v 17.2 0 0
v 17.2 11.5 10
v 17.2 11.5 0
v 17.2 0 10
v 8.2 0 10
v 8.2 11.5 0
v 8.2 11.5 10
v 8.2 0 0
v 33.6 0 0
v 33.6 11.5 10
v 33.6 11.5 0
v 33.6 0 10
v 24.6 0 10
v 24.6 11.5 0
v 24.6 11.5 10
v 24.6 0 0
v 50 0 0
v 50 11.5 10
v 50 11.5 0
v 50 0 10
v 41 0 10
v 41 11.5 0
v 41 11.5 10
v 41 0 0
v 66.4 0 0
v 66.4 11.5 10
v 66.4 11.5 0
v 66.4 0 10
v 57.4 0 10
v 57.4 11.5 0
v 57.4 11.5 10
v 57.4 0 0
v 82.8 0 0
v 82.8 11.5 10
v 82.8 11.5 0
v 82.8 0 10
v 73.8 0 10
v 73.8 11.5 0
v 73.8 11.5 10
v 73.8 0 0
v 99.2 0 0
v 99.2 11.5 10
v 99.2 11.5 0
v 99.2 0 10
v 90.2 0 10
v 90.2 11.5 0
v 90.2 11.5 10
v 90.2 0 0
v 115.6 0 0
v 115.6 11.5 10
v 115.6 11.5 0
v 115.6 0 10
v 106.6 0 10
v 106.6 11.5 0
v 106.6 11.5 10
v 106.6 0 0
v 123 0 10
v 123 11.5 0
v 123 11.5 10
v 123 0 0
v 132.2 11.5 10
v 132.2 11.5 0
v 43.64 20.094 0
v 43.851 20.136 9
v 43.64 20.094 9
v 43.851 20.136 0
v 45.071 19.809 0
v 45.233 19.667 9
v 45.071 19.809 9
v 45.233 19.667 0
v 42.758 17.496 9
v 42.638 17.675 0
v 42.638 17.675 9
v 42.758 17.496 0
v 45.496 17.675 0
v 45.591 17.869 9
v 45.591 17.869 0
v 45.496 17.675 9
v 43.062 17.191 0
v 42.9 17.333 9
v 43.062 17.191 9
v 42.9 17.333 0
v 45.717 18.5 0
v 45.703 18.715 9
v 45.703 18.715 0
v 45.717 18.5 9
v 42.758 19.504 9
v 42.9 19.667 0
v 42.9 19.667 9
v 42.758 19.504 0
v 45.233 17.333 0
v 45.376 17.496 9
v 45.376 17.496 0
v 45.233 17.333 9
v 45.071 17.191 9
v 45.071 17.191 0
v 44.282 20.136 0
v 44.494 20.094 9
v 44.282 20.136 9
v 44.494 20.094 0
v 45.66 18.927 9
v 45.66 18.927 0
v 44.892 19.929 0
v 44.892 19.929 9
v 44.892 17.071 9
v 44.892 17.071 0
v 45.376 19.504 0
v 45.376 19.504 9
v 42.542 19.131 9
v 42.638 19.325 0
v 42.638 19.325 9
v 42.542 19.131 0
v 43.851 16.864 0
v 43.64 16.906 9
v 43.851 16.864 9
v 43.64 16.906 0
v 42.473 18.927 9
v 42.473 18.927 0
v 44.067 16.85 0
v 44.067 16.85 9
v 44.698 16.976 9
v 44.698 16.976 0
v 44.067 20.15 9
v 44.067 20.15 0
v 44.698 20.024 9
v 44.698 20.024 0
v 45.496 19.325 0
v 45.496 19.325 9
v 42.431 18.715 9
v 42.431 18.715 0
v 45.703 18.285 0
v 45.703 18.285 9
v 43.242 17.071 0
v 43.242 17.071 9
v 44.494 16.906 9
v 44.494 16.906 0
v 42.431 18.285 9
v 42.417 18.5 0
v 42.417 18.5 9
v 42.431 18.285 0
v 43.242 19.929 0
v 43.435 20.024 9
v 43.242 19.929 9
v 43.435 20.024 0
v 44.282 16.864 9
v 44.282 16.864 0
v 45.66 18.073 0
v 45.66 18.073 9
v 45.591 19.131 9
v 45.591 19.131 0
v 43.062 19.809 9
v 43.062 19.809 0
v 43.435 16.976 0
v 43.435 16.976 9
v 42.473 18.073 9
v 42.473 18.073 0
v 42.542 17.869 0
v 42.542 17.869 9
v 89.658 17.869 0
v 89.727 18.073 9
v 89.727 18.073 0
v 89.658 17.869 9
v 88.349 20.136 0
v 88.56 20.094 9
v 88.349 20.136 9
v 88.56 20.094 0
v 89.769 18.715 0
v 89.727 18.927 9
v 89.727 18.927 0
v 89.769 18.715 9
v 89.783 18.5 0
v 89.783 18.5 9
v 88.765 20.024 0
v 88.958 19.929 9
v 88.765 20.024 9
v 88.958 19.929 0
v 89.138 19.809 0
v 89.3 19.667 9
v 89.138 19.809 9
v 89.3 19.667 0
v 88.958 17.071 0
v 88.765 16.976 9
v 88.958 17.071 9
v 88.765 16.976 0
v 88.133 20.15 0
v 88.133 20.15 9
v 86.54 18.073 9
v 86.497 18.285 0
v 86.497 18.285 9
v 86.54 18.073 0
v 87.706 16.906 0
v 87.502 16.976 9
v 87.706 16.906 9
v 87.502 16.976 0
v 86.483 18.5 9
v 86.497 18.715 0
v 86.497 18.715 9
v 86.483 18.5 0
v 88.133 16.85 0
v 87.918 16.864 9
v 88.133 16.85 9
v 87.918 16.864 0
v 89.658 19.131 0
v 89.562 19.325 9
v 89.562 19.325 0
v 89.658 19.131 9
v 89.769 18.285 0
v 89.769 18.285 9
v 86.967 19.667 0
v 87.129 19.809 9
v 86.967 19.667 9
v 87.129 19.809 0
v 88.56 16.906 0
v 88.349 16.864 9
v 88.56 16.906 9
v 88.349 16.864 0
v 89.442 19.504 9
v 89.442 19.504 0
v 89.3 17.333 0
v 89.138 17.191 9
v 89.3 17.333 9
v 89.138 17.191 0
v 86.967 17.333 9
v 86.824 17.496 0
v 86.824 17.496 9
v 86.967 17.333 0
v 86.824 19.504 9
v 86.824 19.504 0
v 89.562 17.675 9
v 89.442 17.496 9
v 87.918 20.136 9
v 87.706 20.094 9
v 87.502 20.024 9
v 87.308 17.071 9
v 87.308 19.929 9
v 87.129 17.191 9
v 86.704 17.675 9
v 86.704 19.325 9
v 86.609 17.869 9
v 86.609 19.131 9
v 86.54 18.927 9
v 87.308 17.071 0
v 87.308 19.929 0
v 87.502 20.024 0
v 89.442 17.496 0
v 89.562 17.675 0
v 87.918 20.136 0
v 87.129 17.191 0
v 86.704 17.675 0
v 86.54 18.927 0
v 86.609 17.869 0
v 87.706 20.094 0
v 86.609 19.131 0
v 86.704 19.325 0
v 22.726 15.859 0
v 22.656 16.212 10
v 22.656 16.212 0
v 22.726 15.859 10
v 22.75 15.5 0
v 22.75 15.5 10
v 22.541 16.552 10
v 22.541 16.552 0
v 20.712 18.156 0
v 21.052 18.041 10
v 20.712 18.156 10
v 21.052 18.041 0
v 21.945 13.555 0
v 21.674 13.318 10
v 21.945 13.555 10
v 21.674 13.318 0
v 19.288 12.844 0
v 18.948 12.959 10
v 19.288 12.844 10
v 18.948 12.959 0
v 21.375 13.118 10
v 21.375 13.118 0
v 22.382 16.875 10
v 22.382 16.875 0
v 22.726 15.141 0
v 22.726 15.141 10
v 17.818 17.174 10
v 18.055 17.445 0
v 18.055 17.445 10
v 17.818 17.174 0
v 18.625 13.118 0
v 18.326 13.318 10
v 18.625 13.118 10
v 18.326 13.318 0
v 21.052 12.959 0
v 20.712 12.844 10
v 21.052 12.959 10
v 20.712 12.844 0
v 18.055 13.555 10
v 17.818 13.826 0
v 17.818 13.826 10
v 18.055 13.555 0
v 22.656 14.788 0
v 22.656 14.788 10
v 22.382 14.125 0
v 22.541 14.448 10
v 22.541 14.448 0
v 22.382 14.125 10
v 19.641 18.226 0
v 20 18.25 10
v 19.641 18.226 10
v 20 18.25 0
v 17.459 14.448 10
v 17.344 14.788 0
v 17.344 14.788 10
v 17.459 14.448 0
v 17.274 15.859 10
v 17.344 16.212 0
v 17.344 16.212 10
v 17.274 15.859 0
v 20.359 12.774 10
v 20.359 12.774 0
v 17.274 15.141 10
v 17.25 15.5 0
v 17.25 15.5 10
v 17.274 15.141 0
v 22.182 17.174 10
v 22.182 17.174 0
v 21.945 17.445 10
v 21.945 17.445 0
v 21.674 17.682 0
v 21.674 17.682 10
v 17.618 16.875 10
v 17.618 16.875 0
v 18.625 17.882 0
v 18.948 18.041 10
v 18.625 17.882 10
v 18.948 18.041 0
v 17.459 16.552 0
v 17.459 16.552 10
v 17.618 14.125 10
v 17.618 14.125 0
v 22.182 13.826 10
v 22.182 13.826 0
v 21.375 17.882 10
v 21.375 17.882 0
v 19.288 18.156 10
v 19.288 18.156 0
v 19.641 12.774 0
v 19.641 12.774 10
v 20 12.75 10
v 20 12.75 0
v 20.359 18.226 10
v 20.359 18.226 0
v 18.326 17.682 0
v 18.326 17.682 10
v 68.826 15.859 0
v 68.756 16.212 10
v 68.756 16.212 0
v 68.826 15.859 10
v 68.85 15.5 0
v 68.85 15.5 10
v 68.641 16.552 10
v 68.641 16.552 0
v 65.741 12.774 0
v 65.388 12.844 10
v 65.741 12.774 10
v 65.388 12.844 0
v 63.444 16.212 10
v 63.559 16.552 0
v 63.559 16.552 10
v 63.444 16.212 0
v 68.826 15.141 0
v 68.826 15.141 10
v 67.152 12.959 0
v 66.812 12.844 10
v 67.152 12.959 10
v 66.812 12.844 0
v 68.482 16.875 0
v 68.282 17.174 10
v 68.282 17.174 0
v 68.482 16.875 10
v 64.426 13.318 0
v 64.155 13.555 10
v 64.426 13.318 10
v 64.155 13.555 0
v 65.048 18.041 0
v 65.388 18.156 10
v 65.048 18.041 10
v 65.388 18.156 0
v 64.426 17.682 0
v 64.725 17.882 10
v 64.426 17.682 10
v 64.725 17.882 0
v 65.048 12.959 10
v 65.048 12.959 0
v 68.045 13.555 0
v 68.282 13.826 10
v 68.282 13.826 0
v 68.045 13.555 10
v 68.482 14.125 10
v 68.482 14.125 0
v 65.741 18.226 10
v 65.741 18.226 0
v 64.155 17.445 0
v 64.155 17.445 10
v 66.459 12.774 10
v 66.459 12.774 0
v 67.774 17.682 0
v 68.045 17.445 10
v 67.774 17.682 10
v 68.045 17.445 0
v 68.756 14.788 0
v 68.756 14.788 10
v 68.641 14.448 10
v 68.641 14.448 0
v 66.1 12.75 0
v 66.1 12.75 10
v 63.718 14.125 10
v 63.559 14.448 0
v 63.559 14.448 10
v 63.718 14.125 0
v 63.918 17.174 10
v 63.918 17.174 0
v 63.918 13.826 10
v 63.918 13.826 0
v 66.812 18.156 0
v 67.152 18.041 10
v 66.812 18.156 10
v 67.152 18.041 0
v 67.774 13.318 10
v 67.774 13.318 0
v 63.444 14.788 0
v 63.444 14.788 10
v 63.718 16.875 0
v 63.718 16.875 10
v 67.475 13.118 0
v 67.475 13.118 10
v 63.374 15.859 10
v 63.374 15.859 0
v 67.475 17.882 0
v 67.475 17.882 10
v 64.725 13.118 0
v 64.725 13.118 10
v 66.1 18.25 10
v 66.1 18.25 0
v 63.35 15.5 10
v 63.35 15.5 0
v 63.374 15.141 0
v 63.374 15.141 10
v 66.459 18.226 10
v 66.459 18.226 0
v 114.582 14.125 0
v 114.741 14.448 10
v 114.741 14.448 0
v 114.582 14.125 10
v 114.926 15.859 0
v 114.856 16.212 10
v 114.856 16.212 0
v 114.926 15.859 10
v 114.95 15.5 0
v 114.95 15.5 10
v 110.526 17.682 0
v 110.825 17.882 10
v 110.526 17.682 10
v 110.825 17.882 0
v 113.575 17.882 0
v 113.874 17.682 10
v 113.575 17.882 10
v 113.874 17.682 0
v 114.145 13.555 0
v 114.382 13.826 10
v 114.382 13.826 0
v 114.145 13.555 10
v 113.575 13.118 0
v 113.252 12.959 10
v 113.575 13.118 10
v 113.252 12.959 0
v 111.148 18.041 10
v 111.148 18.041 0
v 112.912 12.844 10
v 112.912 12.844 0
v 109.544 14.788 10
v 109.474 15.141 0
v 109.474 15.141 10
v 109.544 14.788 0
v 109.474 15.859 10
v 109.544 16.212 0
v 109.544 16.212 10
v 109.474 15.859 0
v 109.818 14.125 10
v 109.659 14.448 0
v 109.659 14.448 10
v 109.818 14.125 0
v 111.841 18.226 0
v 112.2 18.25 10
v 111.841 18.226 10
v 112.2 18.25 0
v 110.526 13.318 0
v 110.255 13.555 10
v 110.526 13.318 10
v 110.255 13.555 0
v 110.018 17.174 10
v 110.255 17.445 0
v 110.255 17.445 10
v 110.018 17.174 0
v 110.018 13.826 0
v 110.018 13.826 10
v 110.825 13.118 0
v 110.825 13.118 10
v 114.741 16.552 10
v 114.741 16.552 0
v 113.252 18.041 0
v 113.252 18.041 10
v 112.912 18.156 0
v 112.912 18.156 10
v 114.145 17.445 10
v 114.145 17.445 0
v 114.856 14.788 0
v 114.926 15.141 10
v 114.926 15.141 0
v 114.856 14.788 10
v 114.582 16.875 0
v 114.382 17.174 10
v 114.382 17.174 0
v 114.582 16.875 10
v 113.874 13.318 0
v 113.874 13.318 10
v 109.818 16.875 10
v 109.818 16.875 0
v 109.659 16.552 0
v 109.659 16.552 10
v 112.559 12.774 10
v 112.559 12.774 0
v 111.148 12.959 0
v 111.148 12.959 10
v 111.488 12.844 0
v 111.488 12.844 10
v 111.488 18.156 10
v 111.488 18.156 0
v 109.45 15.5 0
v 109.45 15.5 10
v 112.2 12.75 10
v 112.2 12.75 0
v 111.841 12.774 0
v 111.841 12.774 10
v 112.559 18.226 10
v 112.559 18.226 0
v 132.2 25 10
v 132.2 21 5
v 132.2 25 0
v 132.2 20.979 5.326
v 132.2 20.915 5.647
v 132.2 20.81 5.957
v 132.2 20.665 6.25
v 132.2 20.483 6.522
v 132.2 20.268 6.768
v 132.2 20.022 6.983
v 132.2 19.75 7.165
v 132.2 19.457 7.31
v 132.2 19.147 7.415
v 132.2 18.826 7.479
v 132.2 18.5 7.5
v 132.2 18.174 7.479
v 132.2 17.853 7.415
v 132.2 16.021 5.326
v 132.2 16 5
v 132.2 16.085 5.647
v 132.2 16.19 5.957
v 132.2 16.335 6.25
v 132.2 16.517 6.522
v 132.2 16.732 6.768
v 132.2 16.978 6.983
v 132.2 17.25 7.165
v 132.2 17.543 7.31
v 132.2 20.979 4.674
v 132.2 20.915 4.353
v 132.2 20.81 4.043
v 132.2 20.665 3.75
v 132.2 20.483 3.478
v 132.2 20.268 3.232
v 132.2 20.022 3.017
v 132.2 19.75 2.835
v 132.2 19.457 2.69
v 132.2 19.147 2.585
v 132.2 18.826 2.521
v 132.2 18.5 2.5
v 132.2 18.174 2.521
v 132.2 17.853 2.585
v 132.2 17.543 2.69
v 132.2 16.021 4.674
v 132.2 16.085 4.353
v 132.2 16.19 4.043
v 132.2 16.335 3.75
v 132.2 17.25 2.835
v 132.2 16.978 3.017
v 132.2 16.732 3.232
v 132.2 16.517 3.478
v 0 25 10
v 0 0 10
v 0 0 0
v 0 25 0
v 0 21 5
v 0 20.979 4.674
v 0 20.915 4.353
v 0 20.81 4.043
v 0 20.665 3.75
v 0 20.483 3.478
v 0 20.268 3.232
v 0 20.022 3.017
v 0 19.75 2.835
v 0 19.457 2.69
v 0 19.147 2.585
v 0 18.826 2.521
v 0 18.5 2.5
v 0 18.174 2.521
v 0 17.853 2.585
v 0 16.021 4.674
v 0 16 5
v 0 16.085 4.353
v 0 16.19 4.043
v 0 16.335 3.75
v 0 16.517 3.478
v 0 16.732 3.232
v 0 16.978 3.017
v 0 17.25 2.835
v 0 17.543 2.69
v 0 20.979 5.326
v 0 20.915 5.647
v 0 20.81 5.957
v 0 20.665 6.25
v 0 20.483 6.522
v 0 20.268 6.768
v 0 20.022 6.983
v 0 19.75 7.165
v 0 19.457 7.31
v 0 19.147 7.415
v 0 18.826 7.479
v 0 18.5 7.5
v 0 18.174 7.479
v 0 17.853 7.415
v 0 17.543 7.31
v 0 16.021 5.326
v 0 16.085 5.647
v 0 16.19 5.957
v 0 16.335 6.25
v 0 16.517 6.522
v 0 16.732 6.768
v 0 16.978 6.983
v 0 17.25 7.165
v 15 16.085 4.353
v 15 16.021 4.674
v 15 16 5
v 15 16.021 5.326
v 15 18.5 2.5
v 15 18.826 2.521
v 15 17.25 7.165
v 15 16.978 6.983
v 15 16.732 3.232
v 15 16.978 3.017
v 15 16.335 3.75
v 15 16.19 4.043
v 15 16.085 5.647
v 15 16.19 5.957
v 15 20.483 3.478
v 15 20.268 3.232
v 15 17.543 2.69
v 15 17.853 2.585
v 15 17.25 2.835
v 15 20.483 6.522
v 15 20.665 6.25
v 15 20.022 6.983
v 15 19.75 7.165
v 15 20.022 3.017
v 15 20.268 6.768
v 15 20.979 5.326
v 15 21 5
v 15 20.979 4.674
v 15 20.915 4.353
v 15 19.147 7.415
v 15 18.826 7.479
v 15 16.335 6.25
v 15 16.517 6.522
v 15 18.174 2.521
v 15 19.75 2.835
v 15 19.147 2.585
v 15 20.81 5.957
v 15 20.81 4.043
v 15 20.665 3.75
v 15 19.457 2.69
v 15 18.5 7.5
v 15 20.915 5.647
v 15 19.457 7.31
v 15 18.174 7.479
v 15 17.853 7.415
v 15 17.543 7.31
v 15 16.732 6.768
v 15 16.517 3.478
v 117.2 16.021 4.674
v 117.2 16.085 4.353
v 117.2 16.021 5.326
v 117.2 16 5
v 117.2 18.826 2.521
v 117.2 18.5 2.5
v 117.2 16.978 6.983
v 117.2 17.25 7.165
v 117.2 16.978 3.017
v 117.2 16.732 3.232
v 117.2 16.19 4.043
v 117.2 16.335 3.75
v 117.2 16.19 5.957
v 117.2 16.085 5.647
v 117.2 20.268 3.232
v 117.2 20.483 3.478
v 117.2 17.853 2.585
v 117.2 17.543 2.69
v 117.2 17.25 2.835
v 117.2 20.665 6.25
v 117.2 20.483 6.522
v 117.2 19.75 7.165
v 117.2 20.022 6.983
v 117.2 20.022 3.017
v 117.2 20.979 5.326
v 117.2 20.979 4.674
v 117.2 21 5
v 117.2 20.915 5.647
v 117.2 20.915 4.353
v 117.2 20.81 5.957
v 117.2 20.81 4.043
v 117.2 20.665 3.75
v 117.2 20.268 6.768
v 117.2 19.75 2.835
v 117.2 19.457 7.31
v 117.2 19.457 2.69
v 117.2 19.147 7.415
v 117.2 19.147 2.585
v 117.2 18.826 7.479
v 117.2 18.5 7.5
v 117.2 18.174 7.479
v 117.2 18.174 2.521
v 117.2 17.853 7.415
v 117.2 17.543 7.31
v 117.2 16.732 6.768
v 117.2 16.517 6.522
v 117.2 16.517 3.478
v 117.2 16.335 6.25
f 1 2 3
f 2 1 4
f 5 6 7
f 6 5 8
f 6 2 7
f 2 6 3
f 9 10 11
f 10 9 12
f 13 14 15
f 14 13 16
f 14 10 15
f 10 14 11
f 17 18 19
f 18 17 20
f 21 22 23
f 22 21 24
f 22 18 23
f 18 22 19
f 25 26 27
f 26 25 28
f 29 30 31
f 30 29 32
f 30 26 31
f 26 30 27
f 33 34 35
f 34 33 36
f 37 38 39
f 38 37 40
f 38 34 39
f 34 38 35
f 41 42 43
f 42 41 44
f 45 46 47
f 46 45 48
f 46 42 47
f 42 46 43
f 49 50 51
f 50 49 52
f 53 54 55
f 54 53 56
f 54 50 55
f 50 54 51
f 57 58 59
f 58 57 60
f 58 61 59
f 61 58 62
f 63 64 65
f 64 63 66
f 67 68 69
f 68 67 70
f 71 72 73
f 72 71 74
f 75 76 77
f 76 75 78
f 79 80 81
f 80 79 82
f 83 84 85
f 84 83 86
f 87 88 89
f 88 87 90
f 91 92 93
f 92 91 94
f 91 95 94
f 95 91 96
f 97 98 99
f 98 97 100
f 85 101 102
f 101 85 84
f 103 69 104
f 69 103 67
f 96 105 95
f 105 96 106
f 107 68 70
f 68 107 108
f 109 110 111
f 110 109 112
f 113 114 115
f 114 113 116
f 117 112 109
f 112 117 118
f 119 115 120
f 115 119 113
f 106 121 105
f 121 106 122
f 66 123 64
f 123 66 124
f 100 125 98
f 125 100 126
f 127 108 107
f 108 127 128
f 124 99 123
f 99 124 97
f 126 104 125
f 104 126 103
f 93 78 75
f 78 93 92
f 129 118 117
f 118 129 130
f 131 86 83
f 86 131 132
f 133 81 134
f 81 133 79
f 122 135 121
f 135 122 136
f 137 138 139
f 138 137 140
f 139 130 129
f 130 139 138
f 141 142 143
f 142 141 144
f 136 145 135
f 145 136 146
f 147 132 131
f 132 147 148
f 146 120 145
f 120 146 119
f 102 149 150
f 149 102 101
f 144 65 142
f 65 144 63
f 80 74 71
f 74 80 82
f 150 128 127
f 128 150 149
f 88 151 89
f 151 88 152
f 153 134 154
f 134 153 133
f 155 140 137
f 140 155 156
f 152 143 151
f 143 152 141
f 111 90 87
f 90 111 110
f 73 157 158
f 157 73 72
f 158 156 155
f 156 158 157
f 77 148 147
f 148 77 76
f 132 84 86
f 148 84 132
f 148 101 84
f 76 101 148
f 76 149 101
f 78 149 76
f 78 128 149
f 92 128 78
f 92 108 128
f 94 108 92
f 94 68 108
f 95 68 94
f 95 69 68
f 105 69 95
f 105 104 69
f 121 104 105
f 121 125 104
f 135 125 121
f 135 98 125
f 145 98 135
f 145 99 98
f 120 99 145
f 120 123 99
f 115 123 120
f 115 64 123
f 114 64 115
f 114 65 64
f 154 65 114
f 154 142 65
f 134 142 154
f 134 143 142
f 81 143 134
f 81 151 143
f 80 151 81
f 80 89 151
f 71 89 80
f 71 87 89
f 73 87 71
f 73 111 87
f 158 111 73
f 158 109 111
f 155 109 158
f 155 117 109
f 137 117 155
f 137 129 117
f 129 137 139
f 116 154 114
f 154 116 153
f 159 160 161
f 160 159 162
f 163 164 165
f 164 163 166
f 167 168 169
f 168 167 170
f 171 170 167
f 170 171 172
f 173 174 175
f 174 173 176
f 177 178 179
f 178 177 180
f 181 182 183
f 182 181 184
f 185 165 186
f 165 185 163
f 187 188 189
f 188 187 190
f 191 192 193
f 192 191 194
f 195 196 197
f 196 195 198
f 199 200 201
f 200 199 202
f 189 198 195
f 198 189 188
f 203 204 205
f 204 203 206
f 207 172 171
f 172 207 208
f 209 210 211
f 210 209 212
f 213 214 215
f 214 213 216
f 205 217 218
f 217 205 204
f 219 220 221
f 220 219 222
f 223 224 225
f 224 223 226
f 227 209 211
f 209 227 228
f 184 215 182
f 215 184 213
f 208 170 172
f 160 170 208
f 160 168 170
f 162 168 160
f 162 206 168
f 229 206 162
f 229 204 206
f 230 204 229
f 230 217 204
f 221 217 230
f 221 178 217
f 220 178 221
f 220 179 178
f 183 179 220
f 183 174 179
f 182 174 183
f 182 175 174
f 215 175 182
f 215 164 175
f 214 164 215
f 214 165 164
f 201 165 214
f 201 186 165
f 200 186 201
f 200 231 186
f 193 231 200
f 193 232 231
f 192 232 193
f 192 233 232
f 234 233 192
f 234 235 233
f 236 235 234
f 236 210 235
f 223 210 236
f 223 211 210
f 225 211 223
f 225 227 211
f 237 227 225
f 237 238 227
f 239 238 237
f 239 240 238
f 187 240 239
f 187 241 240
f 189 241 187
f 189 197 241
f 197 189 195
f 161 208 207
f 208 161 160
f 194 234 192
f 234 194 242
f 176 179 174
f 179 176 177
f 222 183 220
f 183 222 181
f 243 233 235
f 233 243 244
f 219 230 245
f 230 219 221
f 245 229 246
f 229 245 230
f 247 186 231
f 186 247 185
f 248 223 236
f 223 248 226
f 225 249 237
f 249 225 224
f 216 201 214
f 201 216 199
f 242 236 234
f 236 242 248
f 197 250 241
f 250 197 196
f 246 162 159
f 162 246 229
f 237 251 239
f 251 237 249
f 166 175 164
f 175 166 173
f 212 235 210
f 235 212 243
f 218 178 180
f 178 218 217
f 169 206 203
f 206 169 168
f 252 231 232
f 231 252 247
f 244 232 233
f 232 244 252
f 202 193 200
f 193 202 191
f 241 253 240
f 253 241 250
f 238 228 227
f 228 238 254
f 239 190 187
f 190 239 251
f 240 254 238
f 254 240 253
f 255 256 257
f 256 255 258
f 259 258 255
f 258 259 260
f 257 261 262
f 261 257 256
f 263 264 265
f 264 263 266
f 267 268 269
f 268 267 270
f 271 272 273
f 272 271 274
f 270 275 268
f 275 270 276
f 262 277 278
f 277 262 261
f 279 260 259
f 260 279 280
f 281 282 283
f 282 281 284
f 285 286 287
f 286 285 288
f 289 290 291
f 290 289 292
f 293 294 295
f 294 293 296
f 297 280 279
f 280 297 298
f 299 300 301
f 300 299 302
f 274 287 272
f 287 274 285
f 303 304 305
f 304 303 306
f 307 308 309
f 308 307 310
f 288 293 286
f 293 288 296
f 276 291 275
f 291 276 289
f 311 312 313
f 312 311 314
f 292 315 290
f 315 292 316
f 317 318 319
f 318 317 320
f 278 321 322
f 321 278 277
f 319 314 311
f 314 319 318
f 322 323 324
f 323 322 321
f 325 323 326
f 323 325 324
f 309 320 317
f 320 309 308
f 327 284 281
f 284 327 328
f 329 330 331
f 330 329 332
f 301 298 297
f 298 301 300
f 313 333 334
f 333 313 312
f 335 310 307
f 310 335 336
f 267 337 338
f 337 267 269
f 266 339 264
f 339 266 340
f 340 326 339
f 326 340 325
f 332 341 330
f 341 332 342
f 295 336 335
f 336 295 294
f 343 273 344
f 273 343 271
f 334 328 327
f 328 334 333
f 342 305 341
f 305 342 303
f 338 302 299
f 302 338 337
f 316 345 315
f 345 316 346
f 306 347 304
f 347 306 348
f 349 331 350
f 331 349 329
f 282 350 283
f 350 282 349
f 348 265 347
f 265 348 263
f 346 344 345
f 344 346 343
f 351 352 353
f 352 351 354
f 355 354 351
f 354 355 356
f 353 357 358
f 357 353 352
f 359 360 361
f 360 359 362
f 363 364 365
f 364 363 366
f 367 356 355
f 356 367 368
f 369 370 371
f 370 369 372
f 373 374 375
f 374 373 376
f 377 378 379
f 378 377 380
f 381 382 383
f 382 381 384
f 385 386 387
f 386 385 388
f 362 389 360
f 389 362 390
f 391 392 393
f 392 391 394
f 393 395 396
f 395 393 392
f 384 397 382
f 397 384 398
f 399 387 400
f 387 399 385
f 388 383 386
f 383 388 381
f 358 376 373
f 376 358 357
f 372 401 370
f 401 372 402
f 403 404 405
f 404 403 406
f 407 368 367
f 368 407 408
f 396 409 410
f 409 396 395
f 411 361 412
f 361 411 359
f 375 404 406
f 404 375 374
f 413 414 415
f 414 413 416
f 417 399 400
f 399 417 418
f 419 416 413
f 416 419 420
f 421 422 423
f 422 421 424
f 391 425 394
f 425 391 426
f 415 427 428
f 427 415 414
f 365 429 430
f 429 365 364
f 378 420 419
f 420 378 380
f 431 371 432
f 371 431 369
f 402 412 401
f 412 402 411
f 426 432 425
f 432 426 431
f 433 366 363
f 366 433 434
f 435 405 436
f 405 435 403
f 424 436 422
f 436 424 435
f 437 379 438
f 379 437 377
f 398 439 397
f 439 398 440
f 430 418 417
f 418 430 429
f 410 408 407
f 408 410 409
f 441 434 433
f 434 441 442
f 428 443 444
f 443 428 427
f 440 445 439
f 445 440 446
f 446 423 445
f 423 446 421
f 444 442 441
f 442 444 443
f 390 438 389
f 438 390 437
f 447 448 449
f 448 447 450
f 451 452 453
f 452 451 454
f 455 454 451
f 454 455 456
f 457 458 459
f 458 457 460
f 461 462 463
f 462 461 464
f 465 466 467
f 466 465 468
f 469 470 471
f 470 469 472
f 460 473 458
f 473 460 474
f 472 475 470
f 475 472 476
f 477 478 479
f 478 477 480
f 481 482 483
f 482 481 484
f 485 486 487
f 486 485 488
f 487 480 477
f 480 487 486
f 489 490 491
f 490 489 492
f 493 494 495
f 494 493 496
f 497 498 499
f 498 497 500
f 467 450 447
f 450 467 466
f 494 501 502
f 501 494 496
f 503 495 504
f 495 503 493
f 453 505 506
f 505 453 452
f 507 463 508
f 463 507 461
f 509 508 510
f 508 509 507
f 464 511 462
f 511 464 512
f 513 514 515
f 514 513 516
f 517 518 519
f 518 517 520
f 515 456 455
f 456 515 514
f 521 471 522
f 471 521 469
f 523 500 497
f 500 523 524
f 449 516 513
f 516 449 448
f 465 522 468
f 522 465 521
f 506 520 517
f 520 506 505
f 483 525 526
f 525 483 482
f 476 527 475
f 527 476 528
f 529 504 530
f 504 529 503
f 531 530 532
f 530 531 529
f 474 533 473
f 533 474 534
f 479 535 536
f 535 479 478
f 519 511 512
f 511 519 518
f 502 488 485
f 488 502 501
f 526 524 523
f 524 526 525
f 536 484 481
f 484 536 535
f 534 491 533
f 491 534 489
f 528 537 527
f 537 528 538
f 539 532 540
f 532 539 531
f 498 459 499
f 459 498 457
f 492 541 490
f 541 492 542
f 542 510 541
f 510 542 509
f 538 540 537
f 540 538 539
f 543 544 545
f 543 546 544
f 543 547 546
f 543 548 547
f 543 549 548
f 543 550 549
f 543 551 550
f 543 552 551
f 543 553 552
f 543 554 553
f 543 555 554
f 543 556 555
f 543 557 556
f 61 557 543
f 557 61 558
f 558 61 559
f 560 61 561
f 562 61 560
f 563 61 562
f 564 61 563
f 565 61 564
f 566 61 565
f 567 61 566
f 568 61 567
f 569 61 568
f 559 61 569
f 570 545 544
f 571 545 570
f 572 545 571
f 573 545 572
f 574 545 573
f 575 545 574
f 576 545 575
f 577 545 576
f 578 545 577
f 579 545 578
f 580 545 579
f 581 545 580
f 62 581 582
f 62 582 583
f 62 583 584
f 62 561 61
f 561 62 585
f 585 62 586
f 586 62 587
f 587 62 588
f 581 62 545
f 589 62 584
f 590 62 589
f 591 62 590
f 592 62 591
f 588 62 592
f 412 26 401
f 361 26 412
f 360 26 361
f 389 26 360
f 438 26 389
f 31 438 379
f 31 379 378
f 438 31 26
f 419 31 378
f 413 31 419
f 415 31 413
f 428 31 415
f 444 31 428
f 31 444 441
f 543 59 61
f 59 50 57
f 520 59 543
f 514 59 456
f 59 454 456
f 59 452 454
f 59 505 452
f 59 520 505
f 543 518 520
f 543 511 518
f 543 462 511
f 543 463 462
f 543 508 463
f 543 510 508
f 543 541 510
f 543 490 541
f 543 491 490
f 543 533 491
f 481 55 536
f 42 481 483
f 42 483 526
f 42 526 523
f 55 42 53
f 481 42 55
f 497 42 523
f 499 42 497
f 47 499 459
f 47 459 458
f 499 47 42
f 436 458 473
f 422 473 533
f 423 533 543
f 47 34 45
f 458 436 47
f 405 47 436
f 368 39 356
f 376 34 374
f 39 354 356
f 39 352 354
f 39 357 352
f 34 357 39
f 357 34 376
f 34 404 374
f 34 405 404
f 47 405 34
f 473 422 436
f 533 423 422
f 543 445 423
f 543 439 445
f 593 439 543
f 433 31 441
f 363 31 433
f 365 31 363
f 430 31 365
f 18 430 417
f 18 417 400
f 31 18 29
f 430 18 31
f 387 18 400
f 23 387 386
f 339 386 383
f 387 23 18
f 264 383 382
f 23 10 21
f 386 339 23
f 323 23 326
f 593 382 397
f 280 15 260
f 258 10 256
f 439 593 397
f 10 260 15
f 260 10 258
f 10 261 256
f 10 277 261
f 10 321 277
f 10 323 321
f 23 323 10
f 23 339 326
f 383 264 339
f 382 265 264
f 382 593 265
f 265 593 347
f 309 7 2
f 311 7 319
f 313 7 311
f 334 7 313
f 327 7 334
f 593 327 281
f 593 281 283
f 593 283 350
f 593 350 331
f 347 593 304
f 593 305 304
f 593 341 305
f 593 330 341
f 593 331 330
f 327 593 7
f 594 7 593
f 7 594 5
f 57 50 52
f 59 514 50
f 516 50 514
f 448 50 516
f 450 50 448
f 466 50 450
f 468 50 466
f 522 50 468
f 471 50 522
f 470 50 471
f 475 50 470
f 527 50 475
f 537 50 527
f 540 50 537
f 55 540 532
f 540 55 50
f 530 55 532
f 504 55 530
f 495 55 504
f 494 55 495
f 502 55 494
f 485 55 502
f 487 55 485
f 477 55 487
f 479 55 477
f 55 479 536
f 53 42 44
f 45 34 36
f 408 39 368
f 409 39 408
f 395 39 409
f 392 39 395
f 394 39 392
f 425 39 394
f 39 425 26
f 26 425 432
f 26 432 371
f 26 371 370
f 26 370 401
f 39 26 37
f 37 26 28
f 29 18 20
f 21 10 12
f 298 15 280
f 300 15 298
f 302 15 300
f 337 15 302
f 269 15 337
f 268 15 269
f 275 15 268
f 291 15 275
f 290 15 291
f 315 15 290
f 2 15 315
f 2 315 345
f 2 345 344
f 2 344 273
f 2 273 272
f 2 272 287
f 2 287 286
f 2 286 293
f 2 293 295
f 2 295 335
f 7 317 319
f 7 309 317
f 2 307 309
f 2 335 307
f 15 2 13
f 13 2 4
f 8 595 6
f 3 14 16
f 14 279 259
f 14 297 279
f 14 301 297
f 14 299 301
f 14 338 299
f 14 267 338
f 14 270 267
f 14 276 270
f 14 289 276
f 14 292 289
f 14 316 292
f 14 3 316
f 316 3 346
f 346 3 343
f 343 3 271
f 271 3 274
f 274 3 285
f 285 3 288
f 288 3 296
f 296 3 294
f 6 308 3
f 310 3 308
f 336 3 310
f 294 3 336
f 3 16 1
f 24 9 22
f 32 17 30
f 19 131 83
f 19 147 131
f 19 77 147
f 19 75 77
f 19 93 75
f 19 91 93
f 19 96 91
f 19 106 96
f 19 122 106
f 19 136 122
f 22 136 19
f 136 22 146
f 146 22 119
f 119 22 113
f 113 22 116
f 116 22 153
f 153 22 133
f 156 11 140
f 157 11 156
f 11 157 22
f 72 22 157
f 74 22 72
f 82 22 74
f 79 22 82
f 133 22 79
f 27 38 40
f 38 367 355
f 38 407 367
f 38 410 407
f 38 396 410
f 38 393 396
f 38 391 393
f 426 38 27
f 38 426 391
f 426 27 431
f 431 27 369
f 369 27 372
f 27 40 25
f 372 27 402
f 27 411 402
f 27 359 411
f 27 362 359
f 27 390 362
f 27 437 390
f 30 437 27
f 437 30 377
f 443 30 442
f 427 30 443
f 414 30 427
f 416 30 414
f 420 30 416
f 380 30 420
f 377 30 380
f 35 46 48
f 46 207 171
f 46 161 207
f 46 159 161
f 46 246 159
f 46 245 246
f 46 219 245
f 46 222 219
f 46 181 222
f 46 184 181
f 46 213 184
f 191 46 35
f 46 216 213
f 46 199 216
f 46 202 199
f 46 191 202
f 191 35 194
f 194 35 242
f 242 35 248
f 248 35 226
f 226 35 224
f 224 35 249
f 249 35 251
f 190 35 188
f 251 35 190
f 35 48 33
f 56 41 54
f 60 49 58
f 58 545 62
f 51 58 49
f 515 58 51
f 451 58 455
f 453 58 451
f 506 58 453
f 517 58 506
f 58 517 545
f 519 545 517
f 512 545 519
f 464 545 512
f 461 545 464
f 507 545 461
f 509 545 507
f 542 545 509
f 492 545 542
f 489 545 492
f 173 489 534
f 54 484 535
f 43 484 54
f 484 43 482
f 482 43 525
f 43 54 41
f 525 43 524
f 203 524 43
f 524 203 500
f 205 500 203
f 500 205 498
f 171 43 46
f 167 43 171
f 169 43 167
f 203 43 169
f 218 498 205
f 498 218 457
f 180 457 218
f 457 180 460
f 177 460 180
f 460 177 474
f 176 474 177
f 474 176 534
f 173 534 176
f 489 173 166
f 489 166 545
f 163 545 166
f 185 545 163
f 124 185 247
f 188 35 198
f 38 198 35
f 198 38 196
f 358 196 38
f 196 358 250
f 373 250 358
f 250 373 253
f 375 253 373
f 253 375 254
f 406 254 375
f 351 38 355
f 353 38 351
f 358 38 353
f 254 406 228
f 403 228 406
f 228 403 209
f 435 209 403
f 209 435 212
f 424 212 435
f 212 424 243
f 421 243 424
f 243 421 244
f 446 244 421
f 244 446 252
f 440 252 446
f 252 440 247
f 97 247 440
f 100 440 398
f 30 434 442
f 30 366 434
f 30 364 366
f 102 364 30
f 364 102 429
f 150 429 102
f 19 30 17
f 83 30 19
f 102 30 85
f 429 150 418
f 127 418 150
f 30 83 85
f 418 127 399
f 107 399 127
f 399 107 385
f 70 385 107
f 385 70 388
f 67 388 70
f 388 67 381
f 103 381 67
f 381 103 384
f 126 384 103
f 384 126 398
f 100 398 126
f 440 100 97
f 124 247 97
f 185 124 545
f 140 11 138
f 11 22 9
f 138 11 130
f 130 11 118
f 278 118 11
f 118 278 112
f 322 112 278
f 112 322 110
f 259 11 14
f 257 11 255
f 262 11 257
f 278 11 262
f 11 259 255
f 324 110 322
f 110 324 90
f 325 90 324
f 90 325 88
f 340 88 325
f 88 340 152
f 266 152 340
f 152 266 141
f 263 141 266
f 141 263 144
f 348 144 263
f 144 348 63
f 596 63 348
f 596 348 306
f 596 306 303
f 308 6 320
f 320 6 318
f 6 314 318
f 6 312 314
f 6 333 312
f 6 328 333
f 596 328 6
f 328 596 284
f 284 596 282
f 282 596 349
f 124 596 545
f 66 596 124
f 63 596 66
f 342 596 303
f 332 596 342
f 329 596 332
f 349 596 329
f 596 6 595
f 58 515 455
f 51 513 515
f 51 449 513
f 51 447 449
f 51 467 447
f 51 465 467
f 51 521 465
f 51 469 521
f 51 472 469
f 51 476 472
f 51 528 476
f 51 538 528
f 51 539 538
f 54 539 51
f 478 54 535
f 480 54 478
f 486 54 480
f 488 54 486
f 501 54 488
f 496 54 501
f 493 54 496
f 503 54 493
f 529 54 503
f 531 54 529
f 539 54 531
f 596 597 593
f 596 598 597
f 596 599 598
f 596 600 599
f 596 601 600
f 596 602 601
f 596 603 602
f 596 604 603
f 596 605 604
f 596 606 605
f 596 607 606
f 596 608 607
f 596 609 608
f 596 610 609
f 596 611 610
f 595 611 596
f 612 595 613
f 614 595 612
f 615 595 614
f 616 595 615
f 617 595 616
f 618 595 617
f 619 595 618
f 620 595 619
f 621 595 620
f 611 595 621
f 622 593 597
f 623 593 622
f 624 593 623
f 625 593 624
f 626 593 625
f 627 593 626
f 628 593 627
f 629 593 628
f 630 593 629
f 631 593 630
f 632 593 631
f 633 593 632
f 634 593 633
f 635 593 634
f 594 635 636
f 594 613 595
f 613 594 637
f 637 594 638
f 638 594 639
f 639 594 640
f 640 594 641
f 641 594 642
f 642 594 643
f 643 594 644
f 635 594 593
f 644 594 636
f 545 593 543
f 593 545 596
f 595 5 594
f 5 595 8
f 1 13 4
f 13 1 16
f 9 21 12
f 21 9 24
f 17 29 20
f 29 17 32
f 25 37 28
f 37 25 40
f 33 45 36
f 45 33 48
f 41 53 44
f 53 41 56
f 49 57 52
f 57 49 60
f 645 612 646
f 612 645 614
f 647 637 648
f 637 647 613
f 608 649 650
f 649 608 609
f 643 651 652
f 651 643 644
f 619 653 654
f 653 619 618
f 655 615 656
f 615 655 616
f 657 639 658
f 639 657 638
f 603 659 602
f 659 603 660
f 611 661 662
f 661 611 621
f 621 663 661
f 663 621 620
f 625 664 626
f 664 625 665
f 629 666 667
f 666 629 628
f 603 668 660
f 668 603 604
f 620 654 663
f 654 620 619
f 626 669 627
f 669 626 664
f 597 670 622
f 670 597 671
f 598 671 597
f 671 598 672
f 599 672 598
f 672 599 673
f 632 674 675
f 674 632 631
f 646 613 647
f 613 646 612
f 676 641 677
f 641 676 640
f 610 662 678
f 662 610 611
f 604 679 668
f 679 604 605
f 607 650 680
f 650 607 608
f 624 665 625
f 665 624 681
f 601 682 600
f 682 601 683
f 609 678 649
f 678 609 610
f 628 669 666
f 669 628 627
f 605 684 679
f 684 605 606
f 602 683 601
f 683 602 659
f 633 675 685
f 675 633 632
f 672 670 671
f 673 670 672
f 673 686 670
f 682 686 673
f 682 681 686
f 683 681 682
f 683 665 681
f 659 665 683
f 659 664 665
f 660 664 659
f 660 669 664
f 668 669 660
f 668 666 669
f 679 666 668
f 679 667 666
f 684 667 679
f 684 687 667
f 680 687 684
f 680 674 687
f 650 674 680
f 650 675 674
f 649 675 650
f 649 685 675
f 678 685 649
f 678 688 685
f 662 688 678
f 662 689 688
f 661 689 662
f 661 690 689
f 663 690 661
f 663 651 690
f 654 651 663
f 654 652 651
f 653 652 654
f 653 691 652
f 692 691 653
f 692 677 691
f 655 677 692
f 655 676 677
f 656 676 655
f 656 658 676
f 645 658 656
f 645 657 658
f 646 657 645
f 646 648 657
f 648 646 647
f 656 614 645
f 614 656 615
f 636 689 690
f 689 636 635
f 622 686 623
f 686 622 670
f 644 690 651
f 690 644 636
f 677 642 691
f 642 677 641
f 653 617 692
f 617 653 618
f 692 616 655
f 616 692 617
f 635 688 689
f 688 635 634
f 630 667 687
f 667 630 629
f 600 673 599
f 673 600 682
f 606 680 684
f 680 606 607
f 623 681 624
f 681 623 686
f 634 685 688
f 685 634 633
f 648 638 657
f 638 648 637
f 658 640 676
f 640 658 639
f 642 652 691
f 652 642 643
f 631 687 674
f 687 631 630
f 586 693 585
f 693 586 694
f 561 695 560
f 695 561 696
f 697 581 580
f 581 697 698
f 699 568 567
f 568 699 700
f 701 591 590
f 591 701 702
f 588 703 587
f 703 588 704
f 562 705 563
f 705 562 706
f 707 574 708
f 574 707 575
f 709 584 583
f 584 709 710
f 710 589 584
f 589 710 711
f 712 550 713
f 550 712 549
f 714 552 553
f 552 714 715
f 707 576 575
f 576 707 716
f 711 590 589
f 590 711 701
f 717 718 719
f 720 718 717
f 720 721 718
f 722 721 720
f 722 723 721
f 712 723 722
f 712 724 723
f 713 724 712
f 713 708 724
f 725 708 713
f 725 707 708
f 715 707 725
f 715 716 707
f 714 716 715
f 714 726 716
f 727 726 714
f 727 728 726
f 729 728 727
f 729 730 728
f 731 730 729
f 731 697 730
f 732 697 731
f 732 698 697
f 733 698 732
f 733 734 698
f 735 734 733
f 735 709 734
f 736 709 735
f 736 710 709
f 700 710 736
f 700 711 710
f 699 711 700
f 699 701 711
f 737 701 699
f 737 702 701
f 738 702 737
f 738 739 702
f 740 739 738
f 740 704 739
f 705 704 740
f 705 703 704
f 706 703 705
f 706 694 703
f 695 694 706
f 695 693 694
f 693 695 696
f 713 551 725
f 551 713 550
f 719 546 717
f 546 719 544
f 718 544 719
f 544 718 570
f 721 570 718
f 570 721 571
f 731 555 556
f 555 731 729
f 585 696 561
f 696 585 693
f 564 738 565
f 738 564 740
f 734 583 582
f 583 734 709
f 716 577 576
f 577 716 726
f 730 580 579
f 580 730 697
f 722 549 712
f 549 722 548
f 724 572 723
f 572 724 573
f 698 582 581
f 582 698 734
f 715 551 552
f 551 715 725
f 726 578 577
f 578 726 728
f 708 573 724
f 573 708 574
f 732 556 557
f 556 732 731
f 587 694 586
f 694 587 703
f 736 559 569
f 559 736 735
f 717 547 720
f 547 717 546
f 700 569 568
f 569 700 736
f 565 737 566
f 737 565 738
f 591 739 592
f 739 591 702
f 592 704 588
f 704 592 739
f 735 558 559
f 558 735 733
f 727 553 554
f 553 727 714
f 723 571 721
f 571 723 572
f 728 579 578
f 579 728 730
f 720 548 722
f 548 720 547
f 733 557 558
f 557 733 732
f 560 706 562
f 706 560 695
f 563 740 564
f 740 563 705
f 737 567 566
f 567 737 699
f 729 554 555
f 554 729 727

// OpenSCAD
// file: params.scad
// GENERATED by design/build.py from design/params.py -- do not edit by hand.

C = 60.0;
N_SLOTS = 16.0;
T_BLADE = 8.0;
SIDE_CLEAR = 0.2;
T_SPACER = 8.4;
END_CLEAR = 0.5;
R_TIP = 34.0;
R_ROOT = 25.0;
TEETH = 3.0;
STAGGER_DEG = 15.0;
BLADE_VARIANTS = 4.0;
SPACER_OD = 50.0;
SPACER_BORE = 29.2;
HEX_AF = 25.05;
HEX_BORE_AF = 25.1;
HEX_RELIEF_D = 3.2;
JOURNAL_D = 25.0;
PLATE_H = 70.0;
PLATE_L = 170.0;
LAYER_T = 10.0;
INNER_HOLE_D = 36.0;
CAP_HOLE_D = 32.0;
SEAL_BORE_DEPTH = 7.0;
CAP_BORE_DEPTH = 7.0;
COLLAR_OD = 46.0;
COLLAR_T = 4.0;
SLEEVE_OD = 30.0;
SLEEVE_ID = 25.05;
COMB_W = 25.0;
COMB_GAP = 0.5;
COMB_SLOT_CLEAR = 0.5;
COMB_SLOT_PAST_TIP = 3.0;
COMB_SCREW_Y = 74.0;
WALL_H = 50.0;
WALL_GAP = 2.0;
END_WASHER_T = 10.0;
END_SCREW_LEN = 30.0;
PRINTER_X = 250.0;
PRINTER_Y = 210.0;
PRINTER_Z = 210.0;
PRINT_WALL = 3.0;
PRINT_FLANGE = 4.0;
HOPPER_TOP_Z = 305.0;
HOPPER_TOP_IN = 180.0;
HOPPER_SPLIT_Z = 105.0;
TOP_HOLE_Y = 10.0;
TOP_HOLE_DEPTH = 10.0;
WALL_TOP_HOLE_X = 30.0;
WALL_TOP_HOLE_Y = 71.0;
GUARD_HOLE_Y = 80.0;
GUARD_HOLE_Z = 9.0;
GUARD_CLEAR = 3.0;
BASE_T = 18.0;
WORM_AXIS_DROP = 63.0;
GROUND_Z = -368.0;
MOTOR_SHAFT_L = 40.0;
TL_B_CLEAR = 5.0;
HANDLE_W = 110.0;
HANDLE_H = 40.0;
HANDLE_BACK_T = 8.0;
HANDLE_LIP_D = 26.0;
HANDLE_Z = -200.0;
HANDLE_SCREW_DX = 35.0;
HANDLE_HOLE_D = 4.5;
INSERT_D = 5.6;
INSERT_DEPTH = 6.0;
DRF_GAP = 1.0;
SW_PAD_L = 92.0;
SW_PAD_W = 32.0;
SW_PAD_T = 10.0;
SW_SCREW_SPACING = 22.0;
INTERLOCK_IN = 12.0;
INTERLOCK_OUT_TRAVEL = 15.0;
CG_END_GAP = 1.0;
CG_FOOT_W = 36.0;
CG_FOOT_T = 4.0;
CG_FOOT_REACH = 16.0;
DECK_PLY_T = 18.0;
DECK_MARGIN = 30.0;
LEG_SECTION = 45.0;
STUB_D = 25.0;
STUB_L = 80.0;
STUB_END_D = 30.0;
STUB_END_L = 60.0;
STUB_FLAT_AF = 22.0;
STUB_FLAT_L = 40.0;
STUB_KEY_L = 70.0;
T_LIMIT = 63.25;
HOOK_DEG = 10.0;
TEST_PIN_D = 12.0;
TEST_PIN_R = 32.0;
TEST_PIN_PROJ = 9.0;
TEST_BLADE_GAP = 1.0;
TEST_LEVER_L = 540.0;
TEST_LEVER_W = 50.0;
TEST_LEVER_T = 10.0;
TEST_LEVER_PIVOT_END = 25.0;
TEST_LEVER_PIVOT_D = 25.2;
TEST_WEIGHT_ARM = 500.0;
TEST_WEIGHT_HOLE_D = 10.5;
TEST_WEIGHT_KG = 11.9;
TEST_BLADE_ROT = -30.0;
TEST_LEVER_DEG = 0.0;
T_SET = 55.0;
T_OPERATING = 45.0;
TL_SET_AT_TL = 55.0;
SUBPLATE_T = 20.0;
GB_BOX = [100.0, 100.0, 145.0];
GB_BELOW_OUT = 113.0;
GB_BOSS = 9.0;
GB_FOOT = [124.0, 76.0];
GB_FLANGE = [140.0, 100.0, 8.0];
GB_WORM_STUB = 40.0;
SPROCKET_T = 7.2;
SPROCKET_OD_EXTRA = 6.2;
SPROCKET_ROOT = 7.92;
CHAIN_ENV_W = 18.0;
CHAIN_ENV_H = 12.1;
DRIVE_LEG_MIN = 60.0;
PIN_N = 4.0;
PIN_D = 8.0;
PIN_L = 32.0;
PIN_R = 50.5;
PIN_HOLE_D = 8.5;
PF_D = 120.0;
PF_T = 12.0;
PF_GAP = 2.0;
PF_HUB_D = 50.0;
PF_POCKET_D = 36.0;
PF_POCKET_CLEAR = 2.0;
PF_KEY_L = 25.0;
PF_SHAFT_RECESS = 1.0;
DG_SEAM_Z = 0.0;
DG_FLANGE_W = 12.0;
DG_FLANGE_T = 4.0;
TLFIX_ARM = 500.0;
TLFIX_LEVER_L = 600.0;
TLFIX_LEVER_W = 50.0;
TLFIX_LEVER_T = 10.0;
TL_HUB_D = 42.0;
TL_FLANGE_T = 8.0;
TL_CM_OFFSET = 12.0;
TL_GB_GAP = 3.0;
TL_PACK_D = 70.0;
TL_PRESS_T = 8.0;
TL_SPRING_L = 26.0;
GB_HUB_L = 72.0;
OUT_SPACER_D = 36.0;
SHAFT_KEY_W = 8.0;
SHAFT_KEY_D = 4.0;
GB_KEY_END = 6.0;
TL_KEY_END = 3.0;
CIRCLIP_GROOVE_D = 23.9;
CIRCLIP_GROOVE_W = 1.3;
CIRCLIP_T = 1.2;
CIRCLIP_OD = 31.4;
CIRCLIP_EDGE = 3.0;
GB_RAIL_W = 50.0;
GB_RAIL_T = 10.0;
GB_RAIL_SLOT = 6.0;
GB_RAIL_BOLT_DX = 86.0;
GB_RAIL_END = 10.0;
GB_SPACER_L = 18.0;
DECK_RAIL_MARGIN = 20.0;
DECK_ANCHOR_D = 8.0;
DECK_ANGLE = [40.0, 40.0, 4.0];
DECK_ANGLE_L = 44.0;
DECK_ANGLE_DECK_BOLTS = 2.0;
DECK_ANGLE_LEG_BOLTS = 2.0;
FOOT_ANGLE_LEG_BOLTS = 2.0;
FOOT_ANGLE_ANCHORS = 2.0;
BIG_WASHER_D = 24.0;
BIG_WASHER_T = 2.0;
DECK_LEG_INSET_Y = 45.0;
TLFIX_PIN_L = 25.0;
TLFIX_LEVER_GAP = 5.0;
TLFIX_PIVOT_D = 25.2;
TLFIX_LUG = [20.0, 20.0];
TLFIX_LUG_GAP = 2.4;
SW_BODY = [31.0, 30.0, 90.0];
SW_HOLE_SPACING = 22.0;
SW_SLOT = [5.0, 23.0, 20.0];
ACT_SIZE = [12.0, 20.0, 50.0];
ACT_BLADE_T = 3.0;
ACT_BLADE_L = 20.0;
ACT_HOLE_SPACING = 20.0;
PILOT_D = 3.3;
PILOT_DEPTH = 8.0;
HSW_BODY = [42.0, 38.0, 112.0];
HSW_HOLE_SPACING = 22.0;
HSW_SLOT = [6.0, 24.0, 25.0];
HACT_SIZE = [15.0, 20.0, 68.0];
HACT_BLADE_T = 3.0;
HACT_BLADE_L = 22.0;
HACT_HOLE_SPACING = 30.0;
HSW_SCREW = [4.0, 4.5, 7.0, 3.0, 3.3];
HACT_SCREW = [5.0, 5.5, 8.5, 3.5, 4.2];
HSW_PAD_W = 48.0;
SCREEN_GAP = 2.0;
SCREEN_T = 10.0;
SCREEN_HOLE_D = 5.0;
SCREEN_HOLE_PITCH = 8.0;
SCREEN_HOLE_SLOPE = 50.0;
SCREEN_RELIEF_D = 6.5;
SCREEN_END_GAP = 0.5;
SCREEN_SCREW = [4.0, 4.5, 7.0, 4.0, 8.5];
SCREEN_SCREW_Y = 74.0;
SCREEN_TAP_DEPTH = 9.0;
SCREEN_SCREW_LAND = 8.0;
SCREEN_POCKET = [11.0, 6.0];
WALL_SCREW_HEAD = [8.5, 5.0];
BASE_CUT_Y = 83.0;
CPL_D = 54.0;
CPL_hub_L = 20.6;
CPL_gap = 12.7;
BEARING_name = "NA4905 needle roller bearing with inner ring";
BEARING_d = 25.0;
BEARING_D = 42.0;
BEARING_B = 17.0;
BEARING_F = 30.0;
BEARING_C = 23700.0;
BEARING_C0 = 20500.0;
GEAR_module = 4.0;
GEAR_z = 15.0;
GEAR_alpha = 20.0;
GEAR_bore = 25.0;
GEAR_hub_L = 18.0;
GEAR_cut_extra = 0.1;
GEAR_FACE = 30.0;
GEAR_HUB_L = 18.0;
GEAR_HUB_D = 45.0;
GEAR_SPACER_D = 30.0;
GEAR_KEY_W = 8.0;
GEAR_KEYWAY_H = 3.3;
GEAR_KEY_TOOL_D = 0.4;
OB_T = 10.0;
OB_H = 100.0;
OB_ZC = 3.0;
OB_L = 180.0;
OB_GAP = 2.0;
OB_STEP = 1.5;
PILLAR = [15.0, 60.0];
PILLAR_Y0 = 73.0;
TIE_D = 8.0;
TIE_WASHERS = 3.0;
HOOD_SCREW_PTS = [[76.0, 28.0], [76.0, -28.0], [-76.0, 28.0], [-76.0, -28.0]];
SEAL_d = 30.0;
SEAL_D = 42.0;
SEAL_B = 7.0;
THRUST_d = 30.0;
THRUST_D = 47.0;
THRUST_T = 4.0;
CRINKLE_d = 30.0;
CRINKLE_D = 39.0;
CRINKLE_n = 3.0;
CRINKLE_stack_h = 2.0;
TL_z = 30.0;
TL_L = 62.0;
TL_D = 89.0;
TL_T_min = 34.0;
TL_T_max = 149.0;
CHAIN_pitch = 12.7;
DECK_ANCHOR = "M8";

// derived
blades_per_shaft = 8.0;
stack_A = 131.2;
end_spacer_B = 8.2;
stack_B = 131.0;
chamber_L = 132.2;
overlap = 8.0;
tip_to_spacer = 1.0;
hex_AC = 28.9252;
bore_AC = 28.983;
bearing_x_drive = -18.5;
bearing_x_free = 150.7;
bearing_span = 169.2;
sleeve_L_drive = 10.5;
sleeve_L_free_A = 10.5;
sleeve_L_free_B = 10.7;
x_inner_ring_out_drive = -27.0;
x_cap_out_drive = -30.0;
collar_body_L_drive = 7.0;
x_collar_in_drive = -34.0;
x_collar_out_drive = -38.0;
gear_face = 30.0;
x_gear_in = -38.0;
x_gear_out = -68.0;
x_gear_hub_out = -86.0;
x_ob_in = -88.0;
x_ob_out = -108.0;
x_ob_ring_in = -89.5;
x_ob_ring_out = -106.5;
bearing_x_ob = -98.0;
gear_spacer_L = 3.5;
x_sprocket_in = -110.0;
ob_sleeve_L = 3.5;
x_spA_in = -135.0;
x_sprocket_out = -197.0;
x_cm = -185.0;
a_end_hub_L = 62.0;
ob_sleeve_A_L = 28.5;
standoff_L = 58.0;
x_sprocket_c = -166.0;
x_inner_ring_out_free = 159.2;
x_cap_out_free = 162.2;
collar_body_L_free = 9.0;
x_collar_in_free = 168.2;
x_collar_out_free = 172.2;
shaft_end_free = 170.7;
shaft_end_A_drive = -195.5;
shaft_end_B_drive = -108.5;
shaft_A_len = 366.2;
shaft_B_len = 279.2;
tl_sprocket_pd = 121.498;
sprocket_A_pd = 121.498;
tl_sprocket_root_d = 113.578;
hex_x0 = 1.5;
hex_x1 = 130.7;
gear_pitch_d = 60.0;
gear_od = 68.0;
gear_root_d_std = 50.0;
gear_root_d = 49.8;
gear_cut_depth = 9.1;
comb_edge_y = 55.5;
comb_slot_w = 9.0;
comb_slot_bottom_y = 67.0;
wall_inner_y = 66.0;

// blade torque test lever: computed from the blade outline (design/build.py, test_lever_numbers)
test_pin_Rmin = 30.9995;
test_pin_s = 1.4836;
test_pin_psi = 10.1718;
test_pin_contact_r = 32.54;
test_pin_clear = 0.1807;
hook_face_len = 4.546;
hook_face_end_r = 29.5336;
test_pin_off = -10.8544;
test_pin_edge_steel = 8.1456;
test_pin_ring_steel = 13.4;
test_pin_F = 1976.5625;
test_pin_sigma = 58.2555;
test_pin_deg = -19.8282;
test_face_nrm_deg = 70.0;
// file: common.scad
// common.scad -- shared include for every part file: parameters, blade profile, layout helpers.
// World frame: x along the shafts (x = 0 inner face of the drive-end plate), y across (A at -C/2, B at +C/2), z up.
include <params.scad>
include <blade_profile.scad>

FN = 96;                       // facets for round features (each module sets $fn = FN itself)
N_BLADES = N_SLOTS / 2;        // blades per shaft (= spacers per shaft)

// ---- local frame (u, v, w) -> world:  x = x0 + w,  y = u,  z = v   (a proper rotation)
// Used for everything that is "an axial part": w runs along the shaft, (u, v) = (y, z) across it.
module axial(x0 = 0)
    multmatrix([[0, 0, 1, x0], [1, 0, 0, 0], [0, 1, 0, 0], [0, 0, 0, 1]]) children();

// ---- layout of the cutting stacks
function shaft_y(sh)     = sh == "A" ? -C / 2 : C / 2;
function shaft_sign(sh)  = sh == "A" ? -1 : 1;                       // rotation direction about +x
function stack_x0(sh)    = END_CLEAR + (sh == "A" ? 0 : end_spacer_B); // x of the first blade
function blade_pitch()   = T_BLADE + T_SPACER;
function blade_x0(sh, k) = stack_x0(sh) + k * blade_pitch();         // blade k: x in [x0, x0 + T_BLADE]
function blade_xc(sh, k) = blade_x0(sh, k) + T_BLADE / 2;
function blade_variant(k) = k % BLADE_VARIANTS;
// rotation of blade k in its own 2D frame: j*60 - v*STAGGER, j = -floor(k/4)   (deg)
function blade_rot(k)    = -floor(k / BLADE_VARIANTS) * 60 - blade_variant(k) * STAGGER_DEG;
function sleeve_free_x0(sh) = END_CLEAR + (sh == "A" ? stack_A : stack_B);
function sleeve_free_L(sh)  = sh == "A" ? sleeve_L_free_A : sleeve_L_free_B;
function shaft_x_start(sh)  = sh == "A" ? shaft_end_A_drive : shaft_end_B_drive;
// y span of a comb bar: [lo, hi] (B on +y, A mirrored)
function comb_y_lo(sh) = sh == "B" ? comb_edge_y : -(comb_edge_y + COMB_W);
function comb_y_hi(sh) = sh == "B" ? comb_edge_y + COMB_W : -comb_edge_y;
// main file
// comb.scad -- stripper comb (10 thick bar, slotted for that shaft's blades). World frame (see common.scad).
include <common.scad>

COMB_T = 10;
SLOT_Y_END = comb_slot_bottom_y;         // 67: 3 mm past the blade tip (clears the R3 cutter corners)
COMB_END_HOLE_D = 5;   COMB_END_HOLE_L = 15;   // M6 tapped, both end faces
COMB_THRU_D = 5.5;                                 // wall-screw through holes (vertical)
COMB_THRU_X = [20, chamber_L / 2, chamber_L - 20];
SCREEN_SCREW_XS = [chamber_L / 3, 2 * chamber_L / 3];   // the screen's 4 x M4 (base.scad SCREEN_SCREW_X: the same numbers)

module comb(sh = "B") {
    $fn = 48;
    s = shaft_sign(sh);                         // +1 = B side (+y), -1 = A side (-y)
    lo = comb_y_lo(sh);
    difference() {
        translate([0, lo, -COMB_T / 2]) cube([chamber_L, COMB_W, COMB_T]);
        // one slot per blade of this shaft, from the edge facing the shaft out to |y| = 65
        for (k = [0 : N_BLADES - 1]) {
            xc = blade_xc(sh, k);
            ya = s * (comb_edge_y - 1);          // starts 1 mm inside the edge (cutter overshoot)
            yb = s * SLOT_Y_END;
            // a slot ending within 1 mm of a comb end runs out through that end (no sliver)
            x0 = xc - comb_slot_w / 2 < 1 ? -1 : xc - comb_slot_w / 2;
            x1 = xc + comb_slot_w / 2 > chamber_L - 1 ? chamber_L + 1 : xc + comb_slot_w / 2;
            translate([x0, min(ya, yb), -COMB_T / 2 - 1])
                cube([x1 - x0, abs(yb - ya), COMB_T + 2]);
        }
        // M6 tapped holes into both end faces at |y| = COMB_SCREW_Y, z = 0
        translate([-1, s * COMB_SCREW_Y, 0]) rotate([0, 90, 0]) cylinder(d = COMB_END_HOLE_D, h = COMB_END_HOLE_L + 1);
        translate([chamber_L - COMB_END_HOLE_L, s * COMB_SCREW_Y, 0]) rotate([0, 90, 0]) cylinder(d = COMB_END_HOLE_D, h = COMB_END_HOLE_L + 1);
        // M4 tapped holes up into the underside for the SCREEN (2026-11-15), SCREEN_TAP_DEPTH deep (the wall covers them on top)
        for (x = SCREEN_SCREW_XS) translate([x, s * SCREEN_SCREW_Y, -COMB_T / 2 - 1]) cylinder(d = 3.3, h = SCREEN_TAP_DEPTH + 1);
        // vertical wall-screw holes at |y| = 71
        for (x = COMB_THRU_X) translate([x, s * 71, -COMB_T / 2 - 1]) cylinder(d = COMB_THRU_D, h = COMB_T + 2);
    }
}

// Part frame for export: lying flat, x along the length, y = 0 at the bar edge on the -y side, z in [0, 10].
module comb_part(sh = "B") translate([0, -comb_y_lo(sh), COMB_T / 2]) comb(sh);

// standalone: -D 'sh="A"' ; -D flat=true gives the 2D top-view outline (for DXF)
sh = "B";
flat = false;
if (flat) projection() comb_part(sh); else comb_part(sh);
